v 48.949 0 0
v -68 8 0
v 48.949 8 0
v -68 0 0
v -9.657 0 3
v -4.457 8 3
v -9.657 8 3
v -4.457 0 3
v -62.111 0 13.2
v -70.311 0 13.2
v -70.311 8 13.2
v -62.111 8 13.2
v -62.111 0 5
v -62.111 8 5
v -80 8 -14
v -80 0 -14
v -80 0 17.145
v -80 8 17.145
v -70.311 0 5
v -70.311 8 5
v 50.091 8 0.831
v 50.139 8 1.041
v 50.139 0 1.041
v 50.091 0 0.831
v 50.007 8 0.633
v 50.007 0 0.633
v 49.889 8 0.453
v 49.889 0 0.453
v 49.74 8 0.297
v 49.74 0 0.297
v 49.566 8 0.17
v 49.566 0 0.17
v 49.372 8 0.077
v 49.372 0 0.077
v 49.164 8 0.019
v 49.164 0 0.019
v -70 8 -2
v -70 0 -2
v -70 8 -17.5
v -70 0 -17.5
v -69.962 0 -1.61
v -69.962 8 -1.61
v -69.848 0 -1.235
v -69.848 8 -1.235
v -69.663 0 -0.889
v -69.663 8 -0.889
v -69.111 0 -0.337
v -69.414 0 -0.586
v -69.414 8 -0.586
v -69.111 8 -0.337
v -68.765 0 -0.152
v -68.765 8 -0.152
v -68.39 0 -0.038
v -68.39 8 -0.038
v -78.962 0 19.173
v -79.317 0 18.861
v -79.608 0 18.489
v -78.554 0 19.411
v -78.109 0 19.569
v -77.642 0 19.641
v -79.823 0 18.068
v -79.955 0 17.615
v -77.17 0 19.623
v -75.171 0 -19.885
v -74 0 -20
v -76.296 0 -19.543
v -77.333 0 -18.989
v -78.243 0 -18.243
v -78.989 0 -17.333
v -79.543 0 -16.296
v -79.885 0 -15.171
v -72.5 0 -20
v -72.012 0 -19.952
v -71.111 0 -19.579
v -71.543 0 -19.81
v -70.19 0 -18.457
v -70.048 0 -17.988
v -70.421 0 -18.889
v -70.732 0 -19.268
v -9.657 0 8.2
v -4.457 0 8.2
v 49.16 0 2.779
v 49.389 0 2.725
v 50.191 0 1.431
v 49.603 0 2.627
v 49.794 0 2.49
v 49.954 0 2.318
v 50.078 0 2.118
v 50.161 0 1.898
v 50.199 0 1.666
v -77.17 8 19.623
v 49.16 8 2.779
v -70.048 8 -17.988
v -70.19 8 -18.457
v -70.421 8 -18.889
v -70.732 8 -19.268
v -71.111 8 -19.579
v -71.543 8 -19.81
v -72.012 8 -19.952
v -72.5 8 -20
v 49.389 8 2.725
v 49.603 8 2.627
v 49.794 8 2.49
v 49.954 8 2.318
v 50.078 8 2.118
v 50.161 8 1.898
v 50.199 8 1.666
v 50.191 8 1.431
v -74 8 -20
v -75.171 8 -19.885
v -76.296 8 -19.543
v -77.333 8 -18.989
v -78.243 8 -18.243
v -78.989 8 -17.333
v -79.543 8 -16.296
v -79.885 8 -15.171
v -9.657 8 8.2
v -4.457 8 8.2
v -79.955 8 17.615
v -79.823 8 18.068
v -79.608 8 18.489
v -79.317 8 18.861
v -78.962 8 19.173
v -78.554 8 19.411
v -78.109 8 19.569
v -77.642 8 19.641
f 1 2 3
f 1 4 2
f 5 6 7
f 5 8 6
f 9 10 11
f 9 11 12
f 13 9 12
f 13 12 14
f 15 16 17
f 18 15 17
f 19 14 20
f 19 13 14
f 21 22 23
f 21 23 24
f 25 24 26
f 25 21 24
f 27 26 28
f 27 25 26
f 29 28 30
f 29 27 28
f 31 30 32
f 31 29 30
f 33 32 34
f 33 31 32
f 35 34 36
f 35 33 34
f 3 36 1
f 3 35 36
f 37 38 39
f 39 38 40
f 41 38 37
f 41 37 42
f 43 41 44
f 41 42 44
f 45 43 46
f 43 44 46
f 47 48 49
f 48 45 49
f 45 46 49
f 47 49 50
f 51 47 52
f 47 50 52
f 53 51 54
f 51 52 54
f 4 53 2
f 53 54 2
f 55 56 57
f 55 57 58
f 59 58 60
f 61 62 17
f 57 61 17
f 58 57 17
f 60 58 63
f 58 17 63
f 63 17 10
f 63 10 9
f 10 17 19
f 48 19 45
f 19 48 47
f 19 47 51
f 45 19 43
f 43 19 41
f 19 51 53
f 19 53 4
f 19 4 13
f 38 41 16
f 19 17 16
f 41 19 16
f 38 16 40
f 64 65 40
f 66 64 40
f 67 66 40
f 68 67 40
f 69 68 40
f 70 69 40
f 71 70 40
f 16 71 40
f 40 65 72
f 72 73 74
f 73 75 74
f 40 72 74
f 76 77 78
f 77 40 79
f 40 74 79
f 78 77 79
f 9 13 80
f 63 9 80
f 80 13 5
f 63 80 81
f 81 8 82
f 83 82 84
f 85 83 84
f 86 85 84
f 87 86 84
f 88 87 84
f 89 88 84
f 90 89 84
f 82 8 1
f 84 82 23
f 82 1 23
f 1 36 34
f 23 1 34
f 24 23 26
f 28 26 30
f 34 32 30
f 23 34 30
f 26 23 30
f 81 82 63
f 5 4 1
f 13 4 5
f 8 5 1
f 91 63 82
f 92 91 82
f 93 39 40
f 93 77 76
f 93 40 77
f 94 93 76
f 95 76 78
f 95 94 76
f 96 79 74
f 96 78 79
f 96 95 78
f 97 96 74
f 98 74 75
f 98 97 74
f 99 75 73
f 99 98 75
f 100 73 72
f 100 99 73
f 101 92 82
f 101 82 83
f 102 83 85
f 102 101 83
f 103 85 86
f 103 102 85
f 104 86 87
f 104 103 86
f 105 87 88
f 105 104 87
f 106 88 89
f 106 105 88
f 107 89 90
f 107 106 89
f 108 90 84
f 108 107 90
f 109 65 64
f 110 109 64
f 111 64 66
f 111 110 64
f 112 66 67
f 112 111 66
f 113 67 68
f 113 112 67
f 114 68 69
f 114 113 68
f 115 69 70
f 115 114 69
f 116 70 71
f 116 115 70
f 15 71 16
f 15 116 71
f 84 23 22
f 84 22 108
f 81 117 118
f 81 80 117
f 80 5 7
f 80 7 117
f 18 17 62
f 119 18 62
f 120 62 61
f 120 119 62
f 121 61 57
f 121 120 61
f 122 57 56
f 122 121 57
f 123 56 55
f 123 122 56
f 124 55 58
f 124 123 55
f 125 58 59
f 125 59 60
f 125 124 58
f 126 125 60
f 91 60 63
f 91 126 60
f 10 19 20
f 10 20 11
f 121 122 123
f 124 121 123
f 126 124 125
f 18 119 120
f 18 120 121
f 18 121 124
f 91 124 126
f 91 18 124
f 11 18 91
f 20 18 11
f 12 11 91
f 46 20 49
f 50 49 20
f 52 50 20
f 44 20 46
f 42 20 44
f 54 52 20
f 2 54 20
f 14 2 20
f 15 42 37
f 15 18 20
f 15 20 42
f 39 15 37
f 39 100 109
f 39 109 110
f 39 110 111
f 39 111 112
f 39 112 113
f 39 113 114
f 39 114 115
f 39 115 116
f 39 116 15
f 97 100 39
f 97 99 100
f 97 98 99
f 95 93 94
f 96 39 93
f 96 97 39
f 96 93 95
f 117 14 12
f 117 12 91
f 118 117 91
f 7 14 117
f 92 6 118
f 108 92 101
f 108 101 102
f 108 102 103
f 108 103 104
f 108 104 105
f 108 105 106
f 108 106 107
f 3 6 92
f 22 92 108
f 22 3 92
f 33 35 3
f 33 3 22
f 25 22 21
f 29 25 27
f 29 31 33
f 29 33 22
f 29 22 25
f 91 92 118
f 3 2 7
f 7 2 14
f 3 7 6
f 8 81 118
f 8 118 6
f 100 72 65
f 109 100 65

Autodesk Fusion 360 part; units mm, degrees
sketch "Sketch1" plane through (0, 0, 0) normal (0, 1, 0) x (1, 0, 0)
  line L0 (-70, 0) -> (50, 0)
  line L1 (-70, 0) -> (-70, 20)
  line L2 (-70, 20) -> (-80, 20)
  line L3 (-80, 20) -> (-80, -20)
  line L4 (-80, -20) -> (50.3493, -2.6201)
  line L5 (50, 0) -> (50.3493, -2.6201)
  line L6 (-70.3109, -13.2) -> (-62.1109, -13.2)
  line L7 (-62.1109, -13.2) -> (-62.1109, -5)
  line L8 (-62.1109, -5) -> (-70.3109, -5)
  line L9 (-70.3109, -5) -> (-70.3109, -13.2)
  line L10 (-9.6566, -8.2) -> (-4.4566, -8.2)
  line L11 (-4.4566, -8.2) -> (-4.4566, -3)
  line L12 (-4.4566, -3) -> (-9.6566, -3)
  line L13 (-9.6566, -3) -> (-9.6566, -8.2)
  dimension "d1" = 20
  dimension "d2" = 10
  dimension "d3" = 40
  dimension "d4" = 8.2
  dimension "d5" = 8.2
  dimension "d6" = 5
  dimension "d7" = 5.2
  dimension "d8" = 5.2
  dimension "d9" = 3
extrude "Extrude1" add sketch "Sketch1" along normal blind 8
fillet "Fillet1" radius 2 1 edges at (-70, 4, 0)
fillet "Fillet2" radius 6 1 edges at (-80, 4, -20)
fillet "Fillet3" radius 2.5 1 edges at (-70, 4, -20)
fillet "Fillet4" radius 2.5 1 edges at (-80, 4, 20)
fillet "Fillet5" radius 1.2 2 edges at (50.3493, 4, 2.6201) (50, 4, 0)
